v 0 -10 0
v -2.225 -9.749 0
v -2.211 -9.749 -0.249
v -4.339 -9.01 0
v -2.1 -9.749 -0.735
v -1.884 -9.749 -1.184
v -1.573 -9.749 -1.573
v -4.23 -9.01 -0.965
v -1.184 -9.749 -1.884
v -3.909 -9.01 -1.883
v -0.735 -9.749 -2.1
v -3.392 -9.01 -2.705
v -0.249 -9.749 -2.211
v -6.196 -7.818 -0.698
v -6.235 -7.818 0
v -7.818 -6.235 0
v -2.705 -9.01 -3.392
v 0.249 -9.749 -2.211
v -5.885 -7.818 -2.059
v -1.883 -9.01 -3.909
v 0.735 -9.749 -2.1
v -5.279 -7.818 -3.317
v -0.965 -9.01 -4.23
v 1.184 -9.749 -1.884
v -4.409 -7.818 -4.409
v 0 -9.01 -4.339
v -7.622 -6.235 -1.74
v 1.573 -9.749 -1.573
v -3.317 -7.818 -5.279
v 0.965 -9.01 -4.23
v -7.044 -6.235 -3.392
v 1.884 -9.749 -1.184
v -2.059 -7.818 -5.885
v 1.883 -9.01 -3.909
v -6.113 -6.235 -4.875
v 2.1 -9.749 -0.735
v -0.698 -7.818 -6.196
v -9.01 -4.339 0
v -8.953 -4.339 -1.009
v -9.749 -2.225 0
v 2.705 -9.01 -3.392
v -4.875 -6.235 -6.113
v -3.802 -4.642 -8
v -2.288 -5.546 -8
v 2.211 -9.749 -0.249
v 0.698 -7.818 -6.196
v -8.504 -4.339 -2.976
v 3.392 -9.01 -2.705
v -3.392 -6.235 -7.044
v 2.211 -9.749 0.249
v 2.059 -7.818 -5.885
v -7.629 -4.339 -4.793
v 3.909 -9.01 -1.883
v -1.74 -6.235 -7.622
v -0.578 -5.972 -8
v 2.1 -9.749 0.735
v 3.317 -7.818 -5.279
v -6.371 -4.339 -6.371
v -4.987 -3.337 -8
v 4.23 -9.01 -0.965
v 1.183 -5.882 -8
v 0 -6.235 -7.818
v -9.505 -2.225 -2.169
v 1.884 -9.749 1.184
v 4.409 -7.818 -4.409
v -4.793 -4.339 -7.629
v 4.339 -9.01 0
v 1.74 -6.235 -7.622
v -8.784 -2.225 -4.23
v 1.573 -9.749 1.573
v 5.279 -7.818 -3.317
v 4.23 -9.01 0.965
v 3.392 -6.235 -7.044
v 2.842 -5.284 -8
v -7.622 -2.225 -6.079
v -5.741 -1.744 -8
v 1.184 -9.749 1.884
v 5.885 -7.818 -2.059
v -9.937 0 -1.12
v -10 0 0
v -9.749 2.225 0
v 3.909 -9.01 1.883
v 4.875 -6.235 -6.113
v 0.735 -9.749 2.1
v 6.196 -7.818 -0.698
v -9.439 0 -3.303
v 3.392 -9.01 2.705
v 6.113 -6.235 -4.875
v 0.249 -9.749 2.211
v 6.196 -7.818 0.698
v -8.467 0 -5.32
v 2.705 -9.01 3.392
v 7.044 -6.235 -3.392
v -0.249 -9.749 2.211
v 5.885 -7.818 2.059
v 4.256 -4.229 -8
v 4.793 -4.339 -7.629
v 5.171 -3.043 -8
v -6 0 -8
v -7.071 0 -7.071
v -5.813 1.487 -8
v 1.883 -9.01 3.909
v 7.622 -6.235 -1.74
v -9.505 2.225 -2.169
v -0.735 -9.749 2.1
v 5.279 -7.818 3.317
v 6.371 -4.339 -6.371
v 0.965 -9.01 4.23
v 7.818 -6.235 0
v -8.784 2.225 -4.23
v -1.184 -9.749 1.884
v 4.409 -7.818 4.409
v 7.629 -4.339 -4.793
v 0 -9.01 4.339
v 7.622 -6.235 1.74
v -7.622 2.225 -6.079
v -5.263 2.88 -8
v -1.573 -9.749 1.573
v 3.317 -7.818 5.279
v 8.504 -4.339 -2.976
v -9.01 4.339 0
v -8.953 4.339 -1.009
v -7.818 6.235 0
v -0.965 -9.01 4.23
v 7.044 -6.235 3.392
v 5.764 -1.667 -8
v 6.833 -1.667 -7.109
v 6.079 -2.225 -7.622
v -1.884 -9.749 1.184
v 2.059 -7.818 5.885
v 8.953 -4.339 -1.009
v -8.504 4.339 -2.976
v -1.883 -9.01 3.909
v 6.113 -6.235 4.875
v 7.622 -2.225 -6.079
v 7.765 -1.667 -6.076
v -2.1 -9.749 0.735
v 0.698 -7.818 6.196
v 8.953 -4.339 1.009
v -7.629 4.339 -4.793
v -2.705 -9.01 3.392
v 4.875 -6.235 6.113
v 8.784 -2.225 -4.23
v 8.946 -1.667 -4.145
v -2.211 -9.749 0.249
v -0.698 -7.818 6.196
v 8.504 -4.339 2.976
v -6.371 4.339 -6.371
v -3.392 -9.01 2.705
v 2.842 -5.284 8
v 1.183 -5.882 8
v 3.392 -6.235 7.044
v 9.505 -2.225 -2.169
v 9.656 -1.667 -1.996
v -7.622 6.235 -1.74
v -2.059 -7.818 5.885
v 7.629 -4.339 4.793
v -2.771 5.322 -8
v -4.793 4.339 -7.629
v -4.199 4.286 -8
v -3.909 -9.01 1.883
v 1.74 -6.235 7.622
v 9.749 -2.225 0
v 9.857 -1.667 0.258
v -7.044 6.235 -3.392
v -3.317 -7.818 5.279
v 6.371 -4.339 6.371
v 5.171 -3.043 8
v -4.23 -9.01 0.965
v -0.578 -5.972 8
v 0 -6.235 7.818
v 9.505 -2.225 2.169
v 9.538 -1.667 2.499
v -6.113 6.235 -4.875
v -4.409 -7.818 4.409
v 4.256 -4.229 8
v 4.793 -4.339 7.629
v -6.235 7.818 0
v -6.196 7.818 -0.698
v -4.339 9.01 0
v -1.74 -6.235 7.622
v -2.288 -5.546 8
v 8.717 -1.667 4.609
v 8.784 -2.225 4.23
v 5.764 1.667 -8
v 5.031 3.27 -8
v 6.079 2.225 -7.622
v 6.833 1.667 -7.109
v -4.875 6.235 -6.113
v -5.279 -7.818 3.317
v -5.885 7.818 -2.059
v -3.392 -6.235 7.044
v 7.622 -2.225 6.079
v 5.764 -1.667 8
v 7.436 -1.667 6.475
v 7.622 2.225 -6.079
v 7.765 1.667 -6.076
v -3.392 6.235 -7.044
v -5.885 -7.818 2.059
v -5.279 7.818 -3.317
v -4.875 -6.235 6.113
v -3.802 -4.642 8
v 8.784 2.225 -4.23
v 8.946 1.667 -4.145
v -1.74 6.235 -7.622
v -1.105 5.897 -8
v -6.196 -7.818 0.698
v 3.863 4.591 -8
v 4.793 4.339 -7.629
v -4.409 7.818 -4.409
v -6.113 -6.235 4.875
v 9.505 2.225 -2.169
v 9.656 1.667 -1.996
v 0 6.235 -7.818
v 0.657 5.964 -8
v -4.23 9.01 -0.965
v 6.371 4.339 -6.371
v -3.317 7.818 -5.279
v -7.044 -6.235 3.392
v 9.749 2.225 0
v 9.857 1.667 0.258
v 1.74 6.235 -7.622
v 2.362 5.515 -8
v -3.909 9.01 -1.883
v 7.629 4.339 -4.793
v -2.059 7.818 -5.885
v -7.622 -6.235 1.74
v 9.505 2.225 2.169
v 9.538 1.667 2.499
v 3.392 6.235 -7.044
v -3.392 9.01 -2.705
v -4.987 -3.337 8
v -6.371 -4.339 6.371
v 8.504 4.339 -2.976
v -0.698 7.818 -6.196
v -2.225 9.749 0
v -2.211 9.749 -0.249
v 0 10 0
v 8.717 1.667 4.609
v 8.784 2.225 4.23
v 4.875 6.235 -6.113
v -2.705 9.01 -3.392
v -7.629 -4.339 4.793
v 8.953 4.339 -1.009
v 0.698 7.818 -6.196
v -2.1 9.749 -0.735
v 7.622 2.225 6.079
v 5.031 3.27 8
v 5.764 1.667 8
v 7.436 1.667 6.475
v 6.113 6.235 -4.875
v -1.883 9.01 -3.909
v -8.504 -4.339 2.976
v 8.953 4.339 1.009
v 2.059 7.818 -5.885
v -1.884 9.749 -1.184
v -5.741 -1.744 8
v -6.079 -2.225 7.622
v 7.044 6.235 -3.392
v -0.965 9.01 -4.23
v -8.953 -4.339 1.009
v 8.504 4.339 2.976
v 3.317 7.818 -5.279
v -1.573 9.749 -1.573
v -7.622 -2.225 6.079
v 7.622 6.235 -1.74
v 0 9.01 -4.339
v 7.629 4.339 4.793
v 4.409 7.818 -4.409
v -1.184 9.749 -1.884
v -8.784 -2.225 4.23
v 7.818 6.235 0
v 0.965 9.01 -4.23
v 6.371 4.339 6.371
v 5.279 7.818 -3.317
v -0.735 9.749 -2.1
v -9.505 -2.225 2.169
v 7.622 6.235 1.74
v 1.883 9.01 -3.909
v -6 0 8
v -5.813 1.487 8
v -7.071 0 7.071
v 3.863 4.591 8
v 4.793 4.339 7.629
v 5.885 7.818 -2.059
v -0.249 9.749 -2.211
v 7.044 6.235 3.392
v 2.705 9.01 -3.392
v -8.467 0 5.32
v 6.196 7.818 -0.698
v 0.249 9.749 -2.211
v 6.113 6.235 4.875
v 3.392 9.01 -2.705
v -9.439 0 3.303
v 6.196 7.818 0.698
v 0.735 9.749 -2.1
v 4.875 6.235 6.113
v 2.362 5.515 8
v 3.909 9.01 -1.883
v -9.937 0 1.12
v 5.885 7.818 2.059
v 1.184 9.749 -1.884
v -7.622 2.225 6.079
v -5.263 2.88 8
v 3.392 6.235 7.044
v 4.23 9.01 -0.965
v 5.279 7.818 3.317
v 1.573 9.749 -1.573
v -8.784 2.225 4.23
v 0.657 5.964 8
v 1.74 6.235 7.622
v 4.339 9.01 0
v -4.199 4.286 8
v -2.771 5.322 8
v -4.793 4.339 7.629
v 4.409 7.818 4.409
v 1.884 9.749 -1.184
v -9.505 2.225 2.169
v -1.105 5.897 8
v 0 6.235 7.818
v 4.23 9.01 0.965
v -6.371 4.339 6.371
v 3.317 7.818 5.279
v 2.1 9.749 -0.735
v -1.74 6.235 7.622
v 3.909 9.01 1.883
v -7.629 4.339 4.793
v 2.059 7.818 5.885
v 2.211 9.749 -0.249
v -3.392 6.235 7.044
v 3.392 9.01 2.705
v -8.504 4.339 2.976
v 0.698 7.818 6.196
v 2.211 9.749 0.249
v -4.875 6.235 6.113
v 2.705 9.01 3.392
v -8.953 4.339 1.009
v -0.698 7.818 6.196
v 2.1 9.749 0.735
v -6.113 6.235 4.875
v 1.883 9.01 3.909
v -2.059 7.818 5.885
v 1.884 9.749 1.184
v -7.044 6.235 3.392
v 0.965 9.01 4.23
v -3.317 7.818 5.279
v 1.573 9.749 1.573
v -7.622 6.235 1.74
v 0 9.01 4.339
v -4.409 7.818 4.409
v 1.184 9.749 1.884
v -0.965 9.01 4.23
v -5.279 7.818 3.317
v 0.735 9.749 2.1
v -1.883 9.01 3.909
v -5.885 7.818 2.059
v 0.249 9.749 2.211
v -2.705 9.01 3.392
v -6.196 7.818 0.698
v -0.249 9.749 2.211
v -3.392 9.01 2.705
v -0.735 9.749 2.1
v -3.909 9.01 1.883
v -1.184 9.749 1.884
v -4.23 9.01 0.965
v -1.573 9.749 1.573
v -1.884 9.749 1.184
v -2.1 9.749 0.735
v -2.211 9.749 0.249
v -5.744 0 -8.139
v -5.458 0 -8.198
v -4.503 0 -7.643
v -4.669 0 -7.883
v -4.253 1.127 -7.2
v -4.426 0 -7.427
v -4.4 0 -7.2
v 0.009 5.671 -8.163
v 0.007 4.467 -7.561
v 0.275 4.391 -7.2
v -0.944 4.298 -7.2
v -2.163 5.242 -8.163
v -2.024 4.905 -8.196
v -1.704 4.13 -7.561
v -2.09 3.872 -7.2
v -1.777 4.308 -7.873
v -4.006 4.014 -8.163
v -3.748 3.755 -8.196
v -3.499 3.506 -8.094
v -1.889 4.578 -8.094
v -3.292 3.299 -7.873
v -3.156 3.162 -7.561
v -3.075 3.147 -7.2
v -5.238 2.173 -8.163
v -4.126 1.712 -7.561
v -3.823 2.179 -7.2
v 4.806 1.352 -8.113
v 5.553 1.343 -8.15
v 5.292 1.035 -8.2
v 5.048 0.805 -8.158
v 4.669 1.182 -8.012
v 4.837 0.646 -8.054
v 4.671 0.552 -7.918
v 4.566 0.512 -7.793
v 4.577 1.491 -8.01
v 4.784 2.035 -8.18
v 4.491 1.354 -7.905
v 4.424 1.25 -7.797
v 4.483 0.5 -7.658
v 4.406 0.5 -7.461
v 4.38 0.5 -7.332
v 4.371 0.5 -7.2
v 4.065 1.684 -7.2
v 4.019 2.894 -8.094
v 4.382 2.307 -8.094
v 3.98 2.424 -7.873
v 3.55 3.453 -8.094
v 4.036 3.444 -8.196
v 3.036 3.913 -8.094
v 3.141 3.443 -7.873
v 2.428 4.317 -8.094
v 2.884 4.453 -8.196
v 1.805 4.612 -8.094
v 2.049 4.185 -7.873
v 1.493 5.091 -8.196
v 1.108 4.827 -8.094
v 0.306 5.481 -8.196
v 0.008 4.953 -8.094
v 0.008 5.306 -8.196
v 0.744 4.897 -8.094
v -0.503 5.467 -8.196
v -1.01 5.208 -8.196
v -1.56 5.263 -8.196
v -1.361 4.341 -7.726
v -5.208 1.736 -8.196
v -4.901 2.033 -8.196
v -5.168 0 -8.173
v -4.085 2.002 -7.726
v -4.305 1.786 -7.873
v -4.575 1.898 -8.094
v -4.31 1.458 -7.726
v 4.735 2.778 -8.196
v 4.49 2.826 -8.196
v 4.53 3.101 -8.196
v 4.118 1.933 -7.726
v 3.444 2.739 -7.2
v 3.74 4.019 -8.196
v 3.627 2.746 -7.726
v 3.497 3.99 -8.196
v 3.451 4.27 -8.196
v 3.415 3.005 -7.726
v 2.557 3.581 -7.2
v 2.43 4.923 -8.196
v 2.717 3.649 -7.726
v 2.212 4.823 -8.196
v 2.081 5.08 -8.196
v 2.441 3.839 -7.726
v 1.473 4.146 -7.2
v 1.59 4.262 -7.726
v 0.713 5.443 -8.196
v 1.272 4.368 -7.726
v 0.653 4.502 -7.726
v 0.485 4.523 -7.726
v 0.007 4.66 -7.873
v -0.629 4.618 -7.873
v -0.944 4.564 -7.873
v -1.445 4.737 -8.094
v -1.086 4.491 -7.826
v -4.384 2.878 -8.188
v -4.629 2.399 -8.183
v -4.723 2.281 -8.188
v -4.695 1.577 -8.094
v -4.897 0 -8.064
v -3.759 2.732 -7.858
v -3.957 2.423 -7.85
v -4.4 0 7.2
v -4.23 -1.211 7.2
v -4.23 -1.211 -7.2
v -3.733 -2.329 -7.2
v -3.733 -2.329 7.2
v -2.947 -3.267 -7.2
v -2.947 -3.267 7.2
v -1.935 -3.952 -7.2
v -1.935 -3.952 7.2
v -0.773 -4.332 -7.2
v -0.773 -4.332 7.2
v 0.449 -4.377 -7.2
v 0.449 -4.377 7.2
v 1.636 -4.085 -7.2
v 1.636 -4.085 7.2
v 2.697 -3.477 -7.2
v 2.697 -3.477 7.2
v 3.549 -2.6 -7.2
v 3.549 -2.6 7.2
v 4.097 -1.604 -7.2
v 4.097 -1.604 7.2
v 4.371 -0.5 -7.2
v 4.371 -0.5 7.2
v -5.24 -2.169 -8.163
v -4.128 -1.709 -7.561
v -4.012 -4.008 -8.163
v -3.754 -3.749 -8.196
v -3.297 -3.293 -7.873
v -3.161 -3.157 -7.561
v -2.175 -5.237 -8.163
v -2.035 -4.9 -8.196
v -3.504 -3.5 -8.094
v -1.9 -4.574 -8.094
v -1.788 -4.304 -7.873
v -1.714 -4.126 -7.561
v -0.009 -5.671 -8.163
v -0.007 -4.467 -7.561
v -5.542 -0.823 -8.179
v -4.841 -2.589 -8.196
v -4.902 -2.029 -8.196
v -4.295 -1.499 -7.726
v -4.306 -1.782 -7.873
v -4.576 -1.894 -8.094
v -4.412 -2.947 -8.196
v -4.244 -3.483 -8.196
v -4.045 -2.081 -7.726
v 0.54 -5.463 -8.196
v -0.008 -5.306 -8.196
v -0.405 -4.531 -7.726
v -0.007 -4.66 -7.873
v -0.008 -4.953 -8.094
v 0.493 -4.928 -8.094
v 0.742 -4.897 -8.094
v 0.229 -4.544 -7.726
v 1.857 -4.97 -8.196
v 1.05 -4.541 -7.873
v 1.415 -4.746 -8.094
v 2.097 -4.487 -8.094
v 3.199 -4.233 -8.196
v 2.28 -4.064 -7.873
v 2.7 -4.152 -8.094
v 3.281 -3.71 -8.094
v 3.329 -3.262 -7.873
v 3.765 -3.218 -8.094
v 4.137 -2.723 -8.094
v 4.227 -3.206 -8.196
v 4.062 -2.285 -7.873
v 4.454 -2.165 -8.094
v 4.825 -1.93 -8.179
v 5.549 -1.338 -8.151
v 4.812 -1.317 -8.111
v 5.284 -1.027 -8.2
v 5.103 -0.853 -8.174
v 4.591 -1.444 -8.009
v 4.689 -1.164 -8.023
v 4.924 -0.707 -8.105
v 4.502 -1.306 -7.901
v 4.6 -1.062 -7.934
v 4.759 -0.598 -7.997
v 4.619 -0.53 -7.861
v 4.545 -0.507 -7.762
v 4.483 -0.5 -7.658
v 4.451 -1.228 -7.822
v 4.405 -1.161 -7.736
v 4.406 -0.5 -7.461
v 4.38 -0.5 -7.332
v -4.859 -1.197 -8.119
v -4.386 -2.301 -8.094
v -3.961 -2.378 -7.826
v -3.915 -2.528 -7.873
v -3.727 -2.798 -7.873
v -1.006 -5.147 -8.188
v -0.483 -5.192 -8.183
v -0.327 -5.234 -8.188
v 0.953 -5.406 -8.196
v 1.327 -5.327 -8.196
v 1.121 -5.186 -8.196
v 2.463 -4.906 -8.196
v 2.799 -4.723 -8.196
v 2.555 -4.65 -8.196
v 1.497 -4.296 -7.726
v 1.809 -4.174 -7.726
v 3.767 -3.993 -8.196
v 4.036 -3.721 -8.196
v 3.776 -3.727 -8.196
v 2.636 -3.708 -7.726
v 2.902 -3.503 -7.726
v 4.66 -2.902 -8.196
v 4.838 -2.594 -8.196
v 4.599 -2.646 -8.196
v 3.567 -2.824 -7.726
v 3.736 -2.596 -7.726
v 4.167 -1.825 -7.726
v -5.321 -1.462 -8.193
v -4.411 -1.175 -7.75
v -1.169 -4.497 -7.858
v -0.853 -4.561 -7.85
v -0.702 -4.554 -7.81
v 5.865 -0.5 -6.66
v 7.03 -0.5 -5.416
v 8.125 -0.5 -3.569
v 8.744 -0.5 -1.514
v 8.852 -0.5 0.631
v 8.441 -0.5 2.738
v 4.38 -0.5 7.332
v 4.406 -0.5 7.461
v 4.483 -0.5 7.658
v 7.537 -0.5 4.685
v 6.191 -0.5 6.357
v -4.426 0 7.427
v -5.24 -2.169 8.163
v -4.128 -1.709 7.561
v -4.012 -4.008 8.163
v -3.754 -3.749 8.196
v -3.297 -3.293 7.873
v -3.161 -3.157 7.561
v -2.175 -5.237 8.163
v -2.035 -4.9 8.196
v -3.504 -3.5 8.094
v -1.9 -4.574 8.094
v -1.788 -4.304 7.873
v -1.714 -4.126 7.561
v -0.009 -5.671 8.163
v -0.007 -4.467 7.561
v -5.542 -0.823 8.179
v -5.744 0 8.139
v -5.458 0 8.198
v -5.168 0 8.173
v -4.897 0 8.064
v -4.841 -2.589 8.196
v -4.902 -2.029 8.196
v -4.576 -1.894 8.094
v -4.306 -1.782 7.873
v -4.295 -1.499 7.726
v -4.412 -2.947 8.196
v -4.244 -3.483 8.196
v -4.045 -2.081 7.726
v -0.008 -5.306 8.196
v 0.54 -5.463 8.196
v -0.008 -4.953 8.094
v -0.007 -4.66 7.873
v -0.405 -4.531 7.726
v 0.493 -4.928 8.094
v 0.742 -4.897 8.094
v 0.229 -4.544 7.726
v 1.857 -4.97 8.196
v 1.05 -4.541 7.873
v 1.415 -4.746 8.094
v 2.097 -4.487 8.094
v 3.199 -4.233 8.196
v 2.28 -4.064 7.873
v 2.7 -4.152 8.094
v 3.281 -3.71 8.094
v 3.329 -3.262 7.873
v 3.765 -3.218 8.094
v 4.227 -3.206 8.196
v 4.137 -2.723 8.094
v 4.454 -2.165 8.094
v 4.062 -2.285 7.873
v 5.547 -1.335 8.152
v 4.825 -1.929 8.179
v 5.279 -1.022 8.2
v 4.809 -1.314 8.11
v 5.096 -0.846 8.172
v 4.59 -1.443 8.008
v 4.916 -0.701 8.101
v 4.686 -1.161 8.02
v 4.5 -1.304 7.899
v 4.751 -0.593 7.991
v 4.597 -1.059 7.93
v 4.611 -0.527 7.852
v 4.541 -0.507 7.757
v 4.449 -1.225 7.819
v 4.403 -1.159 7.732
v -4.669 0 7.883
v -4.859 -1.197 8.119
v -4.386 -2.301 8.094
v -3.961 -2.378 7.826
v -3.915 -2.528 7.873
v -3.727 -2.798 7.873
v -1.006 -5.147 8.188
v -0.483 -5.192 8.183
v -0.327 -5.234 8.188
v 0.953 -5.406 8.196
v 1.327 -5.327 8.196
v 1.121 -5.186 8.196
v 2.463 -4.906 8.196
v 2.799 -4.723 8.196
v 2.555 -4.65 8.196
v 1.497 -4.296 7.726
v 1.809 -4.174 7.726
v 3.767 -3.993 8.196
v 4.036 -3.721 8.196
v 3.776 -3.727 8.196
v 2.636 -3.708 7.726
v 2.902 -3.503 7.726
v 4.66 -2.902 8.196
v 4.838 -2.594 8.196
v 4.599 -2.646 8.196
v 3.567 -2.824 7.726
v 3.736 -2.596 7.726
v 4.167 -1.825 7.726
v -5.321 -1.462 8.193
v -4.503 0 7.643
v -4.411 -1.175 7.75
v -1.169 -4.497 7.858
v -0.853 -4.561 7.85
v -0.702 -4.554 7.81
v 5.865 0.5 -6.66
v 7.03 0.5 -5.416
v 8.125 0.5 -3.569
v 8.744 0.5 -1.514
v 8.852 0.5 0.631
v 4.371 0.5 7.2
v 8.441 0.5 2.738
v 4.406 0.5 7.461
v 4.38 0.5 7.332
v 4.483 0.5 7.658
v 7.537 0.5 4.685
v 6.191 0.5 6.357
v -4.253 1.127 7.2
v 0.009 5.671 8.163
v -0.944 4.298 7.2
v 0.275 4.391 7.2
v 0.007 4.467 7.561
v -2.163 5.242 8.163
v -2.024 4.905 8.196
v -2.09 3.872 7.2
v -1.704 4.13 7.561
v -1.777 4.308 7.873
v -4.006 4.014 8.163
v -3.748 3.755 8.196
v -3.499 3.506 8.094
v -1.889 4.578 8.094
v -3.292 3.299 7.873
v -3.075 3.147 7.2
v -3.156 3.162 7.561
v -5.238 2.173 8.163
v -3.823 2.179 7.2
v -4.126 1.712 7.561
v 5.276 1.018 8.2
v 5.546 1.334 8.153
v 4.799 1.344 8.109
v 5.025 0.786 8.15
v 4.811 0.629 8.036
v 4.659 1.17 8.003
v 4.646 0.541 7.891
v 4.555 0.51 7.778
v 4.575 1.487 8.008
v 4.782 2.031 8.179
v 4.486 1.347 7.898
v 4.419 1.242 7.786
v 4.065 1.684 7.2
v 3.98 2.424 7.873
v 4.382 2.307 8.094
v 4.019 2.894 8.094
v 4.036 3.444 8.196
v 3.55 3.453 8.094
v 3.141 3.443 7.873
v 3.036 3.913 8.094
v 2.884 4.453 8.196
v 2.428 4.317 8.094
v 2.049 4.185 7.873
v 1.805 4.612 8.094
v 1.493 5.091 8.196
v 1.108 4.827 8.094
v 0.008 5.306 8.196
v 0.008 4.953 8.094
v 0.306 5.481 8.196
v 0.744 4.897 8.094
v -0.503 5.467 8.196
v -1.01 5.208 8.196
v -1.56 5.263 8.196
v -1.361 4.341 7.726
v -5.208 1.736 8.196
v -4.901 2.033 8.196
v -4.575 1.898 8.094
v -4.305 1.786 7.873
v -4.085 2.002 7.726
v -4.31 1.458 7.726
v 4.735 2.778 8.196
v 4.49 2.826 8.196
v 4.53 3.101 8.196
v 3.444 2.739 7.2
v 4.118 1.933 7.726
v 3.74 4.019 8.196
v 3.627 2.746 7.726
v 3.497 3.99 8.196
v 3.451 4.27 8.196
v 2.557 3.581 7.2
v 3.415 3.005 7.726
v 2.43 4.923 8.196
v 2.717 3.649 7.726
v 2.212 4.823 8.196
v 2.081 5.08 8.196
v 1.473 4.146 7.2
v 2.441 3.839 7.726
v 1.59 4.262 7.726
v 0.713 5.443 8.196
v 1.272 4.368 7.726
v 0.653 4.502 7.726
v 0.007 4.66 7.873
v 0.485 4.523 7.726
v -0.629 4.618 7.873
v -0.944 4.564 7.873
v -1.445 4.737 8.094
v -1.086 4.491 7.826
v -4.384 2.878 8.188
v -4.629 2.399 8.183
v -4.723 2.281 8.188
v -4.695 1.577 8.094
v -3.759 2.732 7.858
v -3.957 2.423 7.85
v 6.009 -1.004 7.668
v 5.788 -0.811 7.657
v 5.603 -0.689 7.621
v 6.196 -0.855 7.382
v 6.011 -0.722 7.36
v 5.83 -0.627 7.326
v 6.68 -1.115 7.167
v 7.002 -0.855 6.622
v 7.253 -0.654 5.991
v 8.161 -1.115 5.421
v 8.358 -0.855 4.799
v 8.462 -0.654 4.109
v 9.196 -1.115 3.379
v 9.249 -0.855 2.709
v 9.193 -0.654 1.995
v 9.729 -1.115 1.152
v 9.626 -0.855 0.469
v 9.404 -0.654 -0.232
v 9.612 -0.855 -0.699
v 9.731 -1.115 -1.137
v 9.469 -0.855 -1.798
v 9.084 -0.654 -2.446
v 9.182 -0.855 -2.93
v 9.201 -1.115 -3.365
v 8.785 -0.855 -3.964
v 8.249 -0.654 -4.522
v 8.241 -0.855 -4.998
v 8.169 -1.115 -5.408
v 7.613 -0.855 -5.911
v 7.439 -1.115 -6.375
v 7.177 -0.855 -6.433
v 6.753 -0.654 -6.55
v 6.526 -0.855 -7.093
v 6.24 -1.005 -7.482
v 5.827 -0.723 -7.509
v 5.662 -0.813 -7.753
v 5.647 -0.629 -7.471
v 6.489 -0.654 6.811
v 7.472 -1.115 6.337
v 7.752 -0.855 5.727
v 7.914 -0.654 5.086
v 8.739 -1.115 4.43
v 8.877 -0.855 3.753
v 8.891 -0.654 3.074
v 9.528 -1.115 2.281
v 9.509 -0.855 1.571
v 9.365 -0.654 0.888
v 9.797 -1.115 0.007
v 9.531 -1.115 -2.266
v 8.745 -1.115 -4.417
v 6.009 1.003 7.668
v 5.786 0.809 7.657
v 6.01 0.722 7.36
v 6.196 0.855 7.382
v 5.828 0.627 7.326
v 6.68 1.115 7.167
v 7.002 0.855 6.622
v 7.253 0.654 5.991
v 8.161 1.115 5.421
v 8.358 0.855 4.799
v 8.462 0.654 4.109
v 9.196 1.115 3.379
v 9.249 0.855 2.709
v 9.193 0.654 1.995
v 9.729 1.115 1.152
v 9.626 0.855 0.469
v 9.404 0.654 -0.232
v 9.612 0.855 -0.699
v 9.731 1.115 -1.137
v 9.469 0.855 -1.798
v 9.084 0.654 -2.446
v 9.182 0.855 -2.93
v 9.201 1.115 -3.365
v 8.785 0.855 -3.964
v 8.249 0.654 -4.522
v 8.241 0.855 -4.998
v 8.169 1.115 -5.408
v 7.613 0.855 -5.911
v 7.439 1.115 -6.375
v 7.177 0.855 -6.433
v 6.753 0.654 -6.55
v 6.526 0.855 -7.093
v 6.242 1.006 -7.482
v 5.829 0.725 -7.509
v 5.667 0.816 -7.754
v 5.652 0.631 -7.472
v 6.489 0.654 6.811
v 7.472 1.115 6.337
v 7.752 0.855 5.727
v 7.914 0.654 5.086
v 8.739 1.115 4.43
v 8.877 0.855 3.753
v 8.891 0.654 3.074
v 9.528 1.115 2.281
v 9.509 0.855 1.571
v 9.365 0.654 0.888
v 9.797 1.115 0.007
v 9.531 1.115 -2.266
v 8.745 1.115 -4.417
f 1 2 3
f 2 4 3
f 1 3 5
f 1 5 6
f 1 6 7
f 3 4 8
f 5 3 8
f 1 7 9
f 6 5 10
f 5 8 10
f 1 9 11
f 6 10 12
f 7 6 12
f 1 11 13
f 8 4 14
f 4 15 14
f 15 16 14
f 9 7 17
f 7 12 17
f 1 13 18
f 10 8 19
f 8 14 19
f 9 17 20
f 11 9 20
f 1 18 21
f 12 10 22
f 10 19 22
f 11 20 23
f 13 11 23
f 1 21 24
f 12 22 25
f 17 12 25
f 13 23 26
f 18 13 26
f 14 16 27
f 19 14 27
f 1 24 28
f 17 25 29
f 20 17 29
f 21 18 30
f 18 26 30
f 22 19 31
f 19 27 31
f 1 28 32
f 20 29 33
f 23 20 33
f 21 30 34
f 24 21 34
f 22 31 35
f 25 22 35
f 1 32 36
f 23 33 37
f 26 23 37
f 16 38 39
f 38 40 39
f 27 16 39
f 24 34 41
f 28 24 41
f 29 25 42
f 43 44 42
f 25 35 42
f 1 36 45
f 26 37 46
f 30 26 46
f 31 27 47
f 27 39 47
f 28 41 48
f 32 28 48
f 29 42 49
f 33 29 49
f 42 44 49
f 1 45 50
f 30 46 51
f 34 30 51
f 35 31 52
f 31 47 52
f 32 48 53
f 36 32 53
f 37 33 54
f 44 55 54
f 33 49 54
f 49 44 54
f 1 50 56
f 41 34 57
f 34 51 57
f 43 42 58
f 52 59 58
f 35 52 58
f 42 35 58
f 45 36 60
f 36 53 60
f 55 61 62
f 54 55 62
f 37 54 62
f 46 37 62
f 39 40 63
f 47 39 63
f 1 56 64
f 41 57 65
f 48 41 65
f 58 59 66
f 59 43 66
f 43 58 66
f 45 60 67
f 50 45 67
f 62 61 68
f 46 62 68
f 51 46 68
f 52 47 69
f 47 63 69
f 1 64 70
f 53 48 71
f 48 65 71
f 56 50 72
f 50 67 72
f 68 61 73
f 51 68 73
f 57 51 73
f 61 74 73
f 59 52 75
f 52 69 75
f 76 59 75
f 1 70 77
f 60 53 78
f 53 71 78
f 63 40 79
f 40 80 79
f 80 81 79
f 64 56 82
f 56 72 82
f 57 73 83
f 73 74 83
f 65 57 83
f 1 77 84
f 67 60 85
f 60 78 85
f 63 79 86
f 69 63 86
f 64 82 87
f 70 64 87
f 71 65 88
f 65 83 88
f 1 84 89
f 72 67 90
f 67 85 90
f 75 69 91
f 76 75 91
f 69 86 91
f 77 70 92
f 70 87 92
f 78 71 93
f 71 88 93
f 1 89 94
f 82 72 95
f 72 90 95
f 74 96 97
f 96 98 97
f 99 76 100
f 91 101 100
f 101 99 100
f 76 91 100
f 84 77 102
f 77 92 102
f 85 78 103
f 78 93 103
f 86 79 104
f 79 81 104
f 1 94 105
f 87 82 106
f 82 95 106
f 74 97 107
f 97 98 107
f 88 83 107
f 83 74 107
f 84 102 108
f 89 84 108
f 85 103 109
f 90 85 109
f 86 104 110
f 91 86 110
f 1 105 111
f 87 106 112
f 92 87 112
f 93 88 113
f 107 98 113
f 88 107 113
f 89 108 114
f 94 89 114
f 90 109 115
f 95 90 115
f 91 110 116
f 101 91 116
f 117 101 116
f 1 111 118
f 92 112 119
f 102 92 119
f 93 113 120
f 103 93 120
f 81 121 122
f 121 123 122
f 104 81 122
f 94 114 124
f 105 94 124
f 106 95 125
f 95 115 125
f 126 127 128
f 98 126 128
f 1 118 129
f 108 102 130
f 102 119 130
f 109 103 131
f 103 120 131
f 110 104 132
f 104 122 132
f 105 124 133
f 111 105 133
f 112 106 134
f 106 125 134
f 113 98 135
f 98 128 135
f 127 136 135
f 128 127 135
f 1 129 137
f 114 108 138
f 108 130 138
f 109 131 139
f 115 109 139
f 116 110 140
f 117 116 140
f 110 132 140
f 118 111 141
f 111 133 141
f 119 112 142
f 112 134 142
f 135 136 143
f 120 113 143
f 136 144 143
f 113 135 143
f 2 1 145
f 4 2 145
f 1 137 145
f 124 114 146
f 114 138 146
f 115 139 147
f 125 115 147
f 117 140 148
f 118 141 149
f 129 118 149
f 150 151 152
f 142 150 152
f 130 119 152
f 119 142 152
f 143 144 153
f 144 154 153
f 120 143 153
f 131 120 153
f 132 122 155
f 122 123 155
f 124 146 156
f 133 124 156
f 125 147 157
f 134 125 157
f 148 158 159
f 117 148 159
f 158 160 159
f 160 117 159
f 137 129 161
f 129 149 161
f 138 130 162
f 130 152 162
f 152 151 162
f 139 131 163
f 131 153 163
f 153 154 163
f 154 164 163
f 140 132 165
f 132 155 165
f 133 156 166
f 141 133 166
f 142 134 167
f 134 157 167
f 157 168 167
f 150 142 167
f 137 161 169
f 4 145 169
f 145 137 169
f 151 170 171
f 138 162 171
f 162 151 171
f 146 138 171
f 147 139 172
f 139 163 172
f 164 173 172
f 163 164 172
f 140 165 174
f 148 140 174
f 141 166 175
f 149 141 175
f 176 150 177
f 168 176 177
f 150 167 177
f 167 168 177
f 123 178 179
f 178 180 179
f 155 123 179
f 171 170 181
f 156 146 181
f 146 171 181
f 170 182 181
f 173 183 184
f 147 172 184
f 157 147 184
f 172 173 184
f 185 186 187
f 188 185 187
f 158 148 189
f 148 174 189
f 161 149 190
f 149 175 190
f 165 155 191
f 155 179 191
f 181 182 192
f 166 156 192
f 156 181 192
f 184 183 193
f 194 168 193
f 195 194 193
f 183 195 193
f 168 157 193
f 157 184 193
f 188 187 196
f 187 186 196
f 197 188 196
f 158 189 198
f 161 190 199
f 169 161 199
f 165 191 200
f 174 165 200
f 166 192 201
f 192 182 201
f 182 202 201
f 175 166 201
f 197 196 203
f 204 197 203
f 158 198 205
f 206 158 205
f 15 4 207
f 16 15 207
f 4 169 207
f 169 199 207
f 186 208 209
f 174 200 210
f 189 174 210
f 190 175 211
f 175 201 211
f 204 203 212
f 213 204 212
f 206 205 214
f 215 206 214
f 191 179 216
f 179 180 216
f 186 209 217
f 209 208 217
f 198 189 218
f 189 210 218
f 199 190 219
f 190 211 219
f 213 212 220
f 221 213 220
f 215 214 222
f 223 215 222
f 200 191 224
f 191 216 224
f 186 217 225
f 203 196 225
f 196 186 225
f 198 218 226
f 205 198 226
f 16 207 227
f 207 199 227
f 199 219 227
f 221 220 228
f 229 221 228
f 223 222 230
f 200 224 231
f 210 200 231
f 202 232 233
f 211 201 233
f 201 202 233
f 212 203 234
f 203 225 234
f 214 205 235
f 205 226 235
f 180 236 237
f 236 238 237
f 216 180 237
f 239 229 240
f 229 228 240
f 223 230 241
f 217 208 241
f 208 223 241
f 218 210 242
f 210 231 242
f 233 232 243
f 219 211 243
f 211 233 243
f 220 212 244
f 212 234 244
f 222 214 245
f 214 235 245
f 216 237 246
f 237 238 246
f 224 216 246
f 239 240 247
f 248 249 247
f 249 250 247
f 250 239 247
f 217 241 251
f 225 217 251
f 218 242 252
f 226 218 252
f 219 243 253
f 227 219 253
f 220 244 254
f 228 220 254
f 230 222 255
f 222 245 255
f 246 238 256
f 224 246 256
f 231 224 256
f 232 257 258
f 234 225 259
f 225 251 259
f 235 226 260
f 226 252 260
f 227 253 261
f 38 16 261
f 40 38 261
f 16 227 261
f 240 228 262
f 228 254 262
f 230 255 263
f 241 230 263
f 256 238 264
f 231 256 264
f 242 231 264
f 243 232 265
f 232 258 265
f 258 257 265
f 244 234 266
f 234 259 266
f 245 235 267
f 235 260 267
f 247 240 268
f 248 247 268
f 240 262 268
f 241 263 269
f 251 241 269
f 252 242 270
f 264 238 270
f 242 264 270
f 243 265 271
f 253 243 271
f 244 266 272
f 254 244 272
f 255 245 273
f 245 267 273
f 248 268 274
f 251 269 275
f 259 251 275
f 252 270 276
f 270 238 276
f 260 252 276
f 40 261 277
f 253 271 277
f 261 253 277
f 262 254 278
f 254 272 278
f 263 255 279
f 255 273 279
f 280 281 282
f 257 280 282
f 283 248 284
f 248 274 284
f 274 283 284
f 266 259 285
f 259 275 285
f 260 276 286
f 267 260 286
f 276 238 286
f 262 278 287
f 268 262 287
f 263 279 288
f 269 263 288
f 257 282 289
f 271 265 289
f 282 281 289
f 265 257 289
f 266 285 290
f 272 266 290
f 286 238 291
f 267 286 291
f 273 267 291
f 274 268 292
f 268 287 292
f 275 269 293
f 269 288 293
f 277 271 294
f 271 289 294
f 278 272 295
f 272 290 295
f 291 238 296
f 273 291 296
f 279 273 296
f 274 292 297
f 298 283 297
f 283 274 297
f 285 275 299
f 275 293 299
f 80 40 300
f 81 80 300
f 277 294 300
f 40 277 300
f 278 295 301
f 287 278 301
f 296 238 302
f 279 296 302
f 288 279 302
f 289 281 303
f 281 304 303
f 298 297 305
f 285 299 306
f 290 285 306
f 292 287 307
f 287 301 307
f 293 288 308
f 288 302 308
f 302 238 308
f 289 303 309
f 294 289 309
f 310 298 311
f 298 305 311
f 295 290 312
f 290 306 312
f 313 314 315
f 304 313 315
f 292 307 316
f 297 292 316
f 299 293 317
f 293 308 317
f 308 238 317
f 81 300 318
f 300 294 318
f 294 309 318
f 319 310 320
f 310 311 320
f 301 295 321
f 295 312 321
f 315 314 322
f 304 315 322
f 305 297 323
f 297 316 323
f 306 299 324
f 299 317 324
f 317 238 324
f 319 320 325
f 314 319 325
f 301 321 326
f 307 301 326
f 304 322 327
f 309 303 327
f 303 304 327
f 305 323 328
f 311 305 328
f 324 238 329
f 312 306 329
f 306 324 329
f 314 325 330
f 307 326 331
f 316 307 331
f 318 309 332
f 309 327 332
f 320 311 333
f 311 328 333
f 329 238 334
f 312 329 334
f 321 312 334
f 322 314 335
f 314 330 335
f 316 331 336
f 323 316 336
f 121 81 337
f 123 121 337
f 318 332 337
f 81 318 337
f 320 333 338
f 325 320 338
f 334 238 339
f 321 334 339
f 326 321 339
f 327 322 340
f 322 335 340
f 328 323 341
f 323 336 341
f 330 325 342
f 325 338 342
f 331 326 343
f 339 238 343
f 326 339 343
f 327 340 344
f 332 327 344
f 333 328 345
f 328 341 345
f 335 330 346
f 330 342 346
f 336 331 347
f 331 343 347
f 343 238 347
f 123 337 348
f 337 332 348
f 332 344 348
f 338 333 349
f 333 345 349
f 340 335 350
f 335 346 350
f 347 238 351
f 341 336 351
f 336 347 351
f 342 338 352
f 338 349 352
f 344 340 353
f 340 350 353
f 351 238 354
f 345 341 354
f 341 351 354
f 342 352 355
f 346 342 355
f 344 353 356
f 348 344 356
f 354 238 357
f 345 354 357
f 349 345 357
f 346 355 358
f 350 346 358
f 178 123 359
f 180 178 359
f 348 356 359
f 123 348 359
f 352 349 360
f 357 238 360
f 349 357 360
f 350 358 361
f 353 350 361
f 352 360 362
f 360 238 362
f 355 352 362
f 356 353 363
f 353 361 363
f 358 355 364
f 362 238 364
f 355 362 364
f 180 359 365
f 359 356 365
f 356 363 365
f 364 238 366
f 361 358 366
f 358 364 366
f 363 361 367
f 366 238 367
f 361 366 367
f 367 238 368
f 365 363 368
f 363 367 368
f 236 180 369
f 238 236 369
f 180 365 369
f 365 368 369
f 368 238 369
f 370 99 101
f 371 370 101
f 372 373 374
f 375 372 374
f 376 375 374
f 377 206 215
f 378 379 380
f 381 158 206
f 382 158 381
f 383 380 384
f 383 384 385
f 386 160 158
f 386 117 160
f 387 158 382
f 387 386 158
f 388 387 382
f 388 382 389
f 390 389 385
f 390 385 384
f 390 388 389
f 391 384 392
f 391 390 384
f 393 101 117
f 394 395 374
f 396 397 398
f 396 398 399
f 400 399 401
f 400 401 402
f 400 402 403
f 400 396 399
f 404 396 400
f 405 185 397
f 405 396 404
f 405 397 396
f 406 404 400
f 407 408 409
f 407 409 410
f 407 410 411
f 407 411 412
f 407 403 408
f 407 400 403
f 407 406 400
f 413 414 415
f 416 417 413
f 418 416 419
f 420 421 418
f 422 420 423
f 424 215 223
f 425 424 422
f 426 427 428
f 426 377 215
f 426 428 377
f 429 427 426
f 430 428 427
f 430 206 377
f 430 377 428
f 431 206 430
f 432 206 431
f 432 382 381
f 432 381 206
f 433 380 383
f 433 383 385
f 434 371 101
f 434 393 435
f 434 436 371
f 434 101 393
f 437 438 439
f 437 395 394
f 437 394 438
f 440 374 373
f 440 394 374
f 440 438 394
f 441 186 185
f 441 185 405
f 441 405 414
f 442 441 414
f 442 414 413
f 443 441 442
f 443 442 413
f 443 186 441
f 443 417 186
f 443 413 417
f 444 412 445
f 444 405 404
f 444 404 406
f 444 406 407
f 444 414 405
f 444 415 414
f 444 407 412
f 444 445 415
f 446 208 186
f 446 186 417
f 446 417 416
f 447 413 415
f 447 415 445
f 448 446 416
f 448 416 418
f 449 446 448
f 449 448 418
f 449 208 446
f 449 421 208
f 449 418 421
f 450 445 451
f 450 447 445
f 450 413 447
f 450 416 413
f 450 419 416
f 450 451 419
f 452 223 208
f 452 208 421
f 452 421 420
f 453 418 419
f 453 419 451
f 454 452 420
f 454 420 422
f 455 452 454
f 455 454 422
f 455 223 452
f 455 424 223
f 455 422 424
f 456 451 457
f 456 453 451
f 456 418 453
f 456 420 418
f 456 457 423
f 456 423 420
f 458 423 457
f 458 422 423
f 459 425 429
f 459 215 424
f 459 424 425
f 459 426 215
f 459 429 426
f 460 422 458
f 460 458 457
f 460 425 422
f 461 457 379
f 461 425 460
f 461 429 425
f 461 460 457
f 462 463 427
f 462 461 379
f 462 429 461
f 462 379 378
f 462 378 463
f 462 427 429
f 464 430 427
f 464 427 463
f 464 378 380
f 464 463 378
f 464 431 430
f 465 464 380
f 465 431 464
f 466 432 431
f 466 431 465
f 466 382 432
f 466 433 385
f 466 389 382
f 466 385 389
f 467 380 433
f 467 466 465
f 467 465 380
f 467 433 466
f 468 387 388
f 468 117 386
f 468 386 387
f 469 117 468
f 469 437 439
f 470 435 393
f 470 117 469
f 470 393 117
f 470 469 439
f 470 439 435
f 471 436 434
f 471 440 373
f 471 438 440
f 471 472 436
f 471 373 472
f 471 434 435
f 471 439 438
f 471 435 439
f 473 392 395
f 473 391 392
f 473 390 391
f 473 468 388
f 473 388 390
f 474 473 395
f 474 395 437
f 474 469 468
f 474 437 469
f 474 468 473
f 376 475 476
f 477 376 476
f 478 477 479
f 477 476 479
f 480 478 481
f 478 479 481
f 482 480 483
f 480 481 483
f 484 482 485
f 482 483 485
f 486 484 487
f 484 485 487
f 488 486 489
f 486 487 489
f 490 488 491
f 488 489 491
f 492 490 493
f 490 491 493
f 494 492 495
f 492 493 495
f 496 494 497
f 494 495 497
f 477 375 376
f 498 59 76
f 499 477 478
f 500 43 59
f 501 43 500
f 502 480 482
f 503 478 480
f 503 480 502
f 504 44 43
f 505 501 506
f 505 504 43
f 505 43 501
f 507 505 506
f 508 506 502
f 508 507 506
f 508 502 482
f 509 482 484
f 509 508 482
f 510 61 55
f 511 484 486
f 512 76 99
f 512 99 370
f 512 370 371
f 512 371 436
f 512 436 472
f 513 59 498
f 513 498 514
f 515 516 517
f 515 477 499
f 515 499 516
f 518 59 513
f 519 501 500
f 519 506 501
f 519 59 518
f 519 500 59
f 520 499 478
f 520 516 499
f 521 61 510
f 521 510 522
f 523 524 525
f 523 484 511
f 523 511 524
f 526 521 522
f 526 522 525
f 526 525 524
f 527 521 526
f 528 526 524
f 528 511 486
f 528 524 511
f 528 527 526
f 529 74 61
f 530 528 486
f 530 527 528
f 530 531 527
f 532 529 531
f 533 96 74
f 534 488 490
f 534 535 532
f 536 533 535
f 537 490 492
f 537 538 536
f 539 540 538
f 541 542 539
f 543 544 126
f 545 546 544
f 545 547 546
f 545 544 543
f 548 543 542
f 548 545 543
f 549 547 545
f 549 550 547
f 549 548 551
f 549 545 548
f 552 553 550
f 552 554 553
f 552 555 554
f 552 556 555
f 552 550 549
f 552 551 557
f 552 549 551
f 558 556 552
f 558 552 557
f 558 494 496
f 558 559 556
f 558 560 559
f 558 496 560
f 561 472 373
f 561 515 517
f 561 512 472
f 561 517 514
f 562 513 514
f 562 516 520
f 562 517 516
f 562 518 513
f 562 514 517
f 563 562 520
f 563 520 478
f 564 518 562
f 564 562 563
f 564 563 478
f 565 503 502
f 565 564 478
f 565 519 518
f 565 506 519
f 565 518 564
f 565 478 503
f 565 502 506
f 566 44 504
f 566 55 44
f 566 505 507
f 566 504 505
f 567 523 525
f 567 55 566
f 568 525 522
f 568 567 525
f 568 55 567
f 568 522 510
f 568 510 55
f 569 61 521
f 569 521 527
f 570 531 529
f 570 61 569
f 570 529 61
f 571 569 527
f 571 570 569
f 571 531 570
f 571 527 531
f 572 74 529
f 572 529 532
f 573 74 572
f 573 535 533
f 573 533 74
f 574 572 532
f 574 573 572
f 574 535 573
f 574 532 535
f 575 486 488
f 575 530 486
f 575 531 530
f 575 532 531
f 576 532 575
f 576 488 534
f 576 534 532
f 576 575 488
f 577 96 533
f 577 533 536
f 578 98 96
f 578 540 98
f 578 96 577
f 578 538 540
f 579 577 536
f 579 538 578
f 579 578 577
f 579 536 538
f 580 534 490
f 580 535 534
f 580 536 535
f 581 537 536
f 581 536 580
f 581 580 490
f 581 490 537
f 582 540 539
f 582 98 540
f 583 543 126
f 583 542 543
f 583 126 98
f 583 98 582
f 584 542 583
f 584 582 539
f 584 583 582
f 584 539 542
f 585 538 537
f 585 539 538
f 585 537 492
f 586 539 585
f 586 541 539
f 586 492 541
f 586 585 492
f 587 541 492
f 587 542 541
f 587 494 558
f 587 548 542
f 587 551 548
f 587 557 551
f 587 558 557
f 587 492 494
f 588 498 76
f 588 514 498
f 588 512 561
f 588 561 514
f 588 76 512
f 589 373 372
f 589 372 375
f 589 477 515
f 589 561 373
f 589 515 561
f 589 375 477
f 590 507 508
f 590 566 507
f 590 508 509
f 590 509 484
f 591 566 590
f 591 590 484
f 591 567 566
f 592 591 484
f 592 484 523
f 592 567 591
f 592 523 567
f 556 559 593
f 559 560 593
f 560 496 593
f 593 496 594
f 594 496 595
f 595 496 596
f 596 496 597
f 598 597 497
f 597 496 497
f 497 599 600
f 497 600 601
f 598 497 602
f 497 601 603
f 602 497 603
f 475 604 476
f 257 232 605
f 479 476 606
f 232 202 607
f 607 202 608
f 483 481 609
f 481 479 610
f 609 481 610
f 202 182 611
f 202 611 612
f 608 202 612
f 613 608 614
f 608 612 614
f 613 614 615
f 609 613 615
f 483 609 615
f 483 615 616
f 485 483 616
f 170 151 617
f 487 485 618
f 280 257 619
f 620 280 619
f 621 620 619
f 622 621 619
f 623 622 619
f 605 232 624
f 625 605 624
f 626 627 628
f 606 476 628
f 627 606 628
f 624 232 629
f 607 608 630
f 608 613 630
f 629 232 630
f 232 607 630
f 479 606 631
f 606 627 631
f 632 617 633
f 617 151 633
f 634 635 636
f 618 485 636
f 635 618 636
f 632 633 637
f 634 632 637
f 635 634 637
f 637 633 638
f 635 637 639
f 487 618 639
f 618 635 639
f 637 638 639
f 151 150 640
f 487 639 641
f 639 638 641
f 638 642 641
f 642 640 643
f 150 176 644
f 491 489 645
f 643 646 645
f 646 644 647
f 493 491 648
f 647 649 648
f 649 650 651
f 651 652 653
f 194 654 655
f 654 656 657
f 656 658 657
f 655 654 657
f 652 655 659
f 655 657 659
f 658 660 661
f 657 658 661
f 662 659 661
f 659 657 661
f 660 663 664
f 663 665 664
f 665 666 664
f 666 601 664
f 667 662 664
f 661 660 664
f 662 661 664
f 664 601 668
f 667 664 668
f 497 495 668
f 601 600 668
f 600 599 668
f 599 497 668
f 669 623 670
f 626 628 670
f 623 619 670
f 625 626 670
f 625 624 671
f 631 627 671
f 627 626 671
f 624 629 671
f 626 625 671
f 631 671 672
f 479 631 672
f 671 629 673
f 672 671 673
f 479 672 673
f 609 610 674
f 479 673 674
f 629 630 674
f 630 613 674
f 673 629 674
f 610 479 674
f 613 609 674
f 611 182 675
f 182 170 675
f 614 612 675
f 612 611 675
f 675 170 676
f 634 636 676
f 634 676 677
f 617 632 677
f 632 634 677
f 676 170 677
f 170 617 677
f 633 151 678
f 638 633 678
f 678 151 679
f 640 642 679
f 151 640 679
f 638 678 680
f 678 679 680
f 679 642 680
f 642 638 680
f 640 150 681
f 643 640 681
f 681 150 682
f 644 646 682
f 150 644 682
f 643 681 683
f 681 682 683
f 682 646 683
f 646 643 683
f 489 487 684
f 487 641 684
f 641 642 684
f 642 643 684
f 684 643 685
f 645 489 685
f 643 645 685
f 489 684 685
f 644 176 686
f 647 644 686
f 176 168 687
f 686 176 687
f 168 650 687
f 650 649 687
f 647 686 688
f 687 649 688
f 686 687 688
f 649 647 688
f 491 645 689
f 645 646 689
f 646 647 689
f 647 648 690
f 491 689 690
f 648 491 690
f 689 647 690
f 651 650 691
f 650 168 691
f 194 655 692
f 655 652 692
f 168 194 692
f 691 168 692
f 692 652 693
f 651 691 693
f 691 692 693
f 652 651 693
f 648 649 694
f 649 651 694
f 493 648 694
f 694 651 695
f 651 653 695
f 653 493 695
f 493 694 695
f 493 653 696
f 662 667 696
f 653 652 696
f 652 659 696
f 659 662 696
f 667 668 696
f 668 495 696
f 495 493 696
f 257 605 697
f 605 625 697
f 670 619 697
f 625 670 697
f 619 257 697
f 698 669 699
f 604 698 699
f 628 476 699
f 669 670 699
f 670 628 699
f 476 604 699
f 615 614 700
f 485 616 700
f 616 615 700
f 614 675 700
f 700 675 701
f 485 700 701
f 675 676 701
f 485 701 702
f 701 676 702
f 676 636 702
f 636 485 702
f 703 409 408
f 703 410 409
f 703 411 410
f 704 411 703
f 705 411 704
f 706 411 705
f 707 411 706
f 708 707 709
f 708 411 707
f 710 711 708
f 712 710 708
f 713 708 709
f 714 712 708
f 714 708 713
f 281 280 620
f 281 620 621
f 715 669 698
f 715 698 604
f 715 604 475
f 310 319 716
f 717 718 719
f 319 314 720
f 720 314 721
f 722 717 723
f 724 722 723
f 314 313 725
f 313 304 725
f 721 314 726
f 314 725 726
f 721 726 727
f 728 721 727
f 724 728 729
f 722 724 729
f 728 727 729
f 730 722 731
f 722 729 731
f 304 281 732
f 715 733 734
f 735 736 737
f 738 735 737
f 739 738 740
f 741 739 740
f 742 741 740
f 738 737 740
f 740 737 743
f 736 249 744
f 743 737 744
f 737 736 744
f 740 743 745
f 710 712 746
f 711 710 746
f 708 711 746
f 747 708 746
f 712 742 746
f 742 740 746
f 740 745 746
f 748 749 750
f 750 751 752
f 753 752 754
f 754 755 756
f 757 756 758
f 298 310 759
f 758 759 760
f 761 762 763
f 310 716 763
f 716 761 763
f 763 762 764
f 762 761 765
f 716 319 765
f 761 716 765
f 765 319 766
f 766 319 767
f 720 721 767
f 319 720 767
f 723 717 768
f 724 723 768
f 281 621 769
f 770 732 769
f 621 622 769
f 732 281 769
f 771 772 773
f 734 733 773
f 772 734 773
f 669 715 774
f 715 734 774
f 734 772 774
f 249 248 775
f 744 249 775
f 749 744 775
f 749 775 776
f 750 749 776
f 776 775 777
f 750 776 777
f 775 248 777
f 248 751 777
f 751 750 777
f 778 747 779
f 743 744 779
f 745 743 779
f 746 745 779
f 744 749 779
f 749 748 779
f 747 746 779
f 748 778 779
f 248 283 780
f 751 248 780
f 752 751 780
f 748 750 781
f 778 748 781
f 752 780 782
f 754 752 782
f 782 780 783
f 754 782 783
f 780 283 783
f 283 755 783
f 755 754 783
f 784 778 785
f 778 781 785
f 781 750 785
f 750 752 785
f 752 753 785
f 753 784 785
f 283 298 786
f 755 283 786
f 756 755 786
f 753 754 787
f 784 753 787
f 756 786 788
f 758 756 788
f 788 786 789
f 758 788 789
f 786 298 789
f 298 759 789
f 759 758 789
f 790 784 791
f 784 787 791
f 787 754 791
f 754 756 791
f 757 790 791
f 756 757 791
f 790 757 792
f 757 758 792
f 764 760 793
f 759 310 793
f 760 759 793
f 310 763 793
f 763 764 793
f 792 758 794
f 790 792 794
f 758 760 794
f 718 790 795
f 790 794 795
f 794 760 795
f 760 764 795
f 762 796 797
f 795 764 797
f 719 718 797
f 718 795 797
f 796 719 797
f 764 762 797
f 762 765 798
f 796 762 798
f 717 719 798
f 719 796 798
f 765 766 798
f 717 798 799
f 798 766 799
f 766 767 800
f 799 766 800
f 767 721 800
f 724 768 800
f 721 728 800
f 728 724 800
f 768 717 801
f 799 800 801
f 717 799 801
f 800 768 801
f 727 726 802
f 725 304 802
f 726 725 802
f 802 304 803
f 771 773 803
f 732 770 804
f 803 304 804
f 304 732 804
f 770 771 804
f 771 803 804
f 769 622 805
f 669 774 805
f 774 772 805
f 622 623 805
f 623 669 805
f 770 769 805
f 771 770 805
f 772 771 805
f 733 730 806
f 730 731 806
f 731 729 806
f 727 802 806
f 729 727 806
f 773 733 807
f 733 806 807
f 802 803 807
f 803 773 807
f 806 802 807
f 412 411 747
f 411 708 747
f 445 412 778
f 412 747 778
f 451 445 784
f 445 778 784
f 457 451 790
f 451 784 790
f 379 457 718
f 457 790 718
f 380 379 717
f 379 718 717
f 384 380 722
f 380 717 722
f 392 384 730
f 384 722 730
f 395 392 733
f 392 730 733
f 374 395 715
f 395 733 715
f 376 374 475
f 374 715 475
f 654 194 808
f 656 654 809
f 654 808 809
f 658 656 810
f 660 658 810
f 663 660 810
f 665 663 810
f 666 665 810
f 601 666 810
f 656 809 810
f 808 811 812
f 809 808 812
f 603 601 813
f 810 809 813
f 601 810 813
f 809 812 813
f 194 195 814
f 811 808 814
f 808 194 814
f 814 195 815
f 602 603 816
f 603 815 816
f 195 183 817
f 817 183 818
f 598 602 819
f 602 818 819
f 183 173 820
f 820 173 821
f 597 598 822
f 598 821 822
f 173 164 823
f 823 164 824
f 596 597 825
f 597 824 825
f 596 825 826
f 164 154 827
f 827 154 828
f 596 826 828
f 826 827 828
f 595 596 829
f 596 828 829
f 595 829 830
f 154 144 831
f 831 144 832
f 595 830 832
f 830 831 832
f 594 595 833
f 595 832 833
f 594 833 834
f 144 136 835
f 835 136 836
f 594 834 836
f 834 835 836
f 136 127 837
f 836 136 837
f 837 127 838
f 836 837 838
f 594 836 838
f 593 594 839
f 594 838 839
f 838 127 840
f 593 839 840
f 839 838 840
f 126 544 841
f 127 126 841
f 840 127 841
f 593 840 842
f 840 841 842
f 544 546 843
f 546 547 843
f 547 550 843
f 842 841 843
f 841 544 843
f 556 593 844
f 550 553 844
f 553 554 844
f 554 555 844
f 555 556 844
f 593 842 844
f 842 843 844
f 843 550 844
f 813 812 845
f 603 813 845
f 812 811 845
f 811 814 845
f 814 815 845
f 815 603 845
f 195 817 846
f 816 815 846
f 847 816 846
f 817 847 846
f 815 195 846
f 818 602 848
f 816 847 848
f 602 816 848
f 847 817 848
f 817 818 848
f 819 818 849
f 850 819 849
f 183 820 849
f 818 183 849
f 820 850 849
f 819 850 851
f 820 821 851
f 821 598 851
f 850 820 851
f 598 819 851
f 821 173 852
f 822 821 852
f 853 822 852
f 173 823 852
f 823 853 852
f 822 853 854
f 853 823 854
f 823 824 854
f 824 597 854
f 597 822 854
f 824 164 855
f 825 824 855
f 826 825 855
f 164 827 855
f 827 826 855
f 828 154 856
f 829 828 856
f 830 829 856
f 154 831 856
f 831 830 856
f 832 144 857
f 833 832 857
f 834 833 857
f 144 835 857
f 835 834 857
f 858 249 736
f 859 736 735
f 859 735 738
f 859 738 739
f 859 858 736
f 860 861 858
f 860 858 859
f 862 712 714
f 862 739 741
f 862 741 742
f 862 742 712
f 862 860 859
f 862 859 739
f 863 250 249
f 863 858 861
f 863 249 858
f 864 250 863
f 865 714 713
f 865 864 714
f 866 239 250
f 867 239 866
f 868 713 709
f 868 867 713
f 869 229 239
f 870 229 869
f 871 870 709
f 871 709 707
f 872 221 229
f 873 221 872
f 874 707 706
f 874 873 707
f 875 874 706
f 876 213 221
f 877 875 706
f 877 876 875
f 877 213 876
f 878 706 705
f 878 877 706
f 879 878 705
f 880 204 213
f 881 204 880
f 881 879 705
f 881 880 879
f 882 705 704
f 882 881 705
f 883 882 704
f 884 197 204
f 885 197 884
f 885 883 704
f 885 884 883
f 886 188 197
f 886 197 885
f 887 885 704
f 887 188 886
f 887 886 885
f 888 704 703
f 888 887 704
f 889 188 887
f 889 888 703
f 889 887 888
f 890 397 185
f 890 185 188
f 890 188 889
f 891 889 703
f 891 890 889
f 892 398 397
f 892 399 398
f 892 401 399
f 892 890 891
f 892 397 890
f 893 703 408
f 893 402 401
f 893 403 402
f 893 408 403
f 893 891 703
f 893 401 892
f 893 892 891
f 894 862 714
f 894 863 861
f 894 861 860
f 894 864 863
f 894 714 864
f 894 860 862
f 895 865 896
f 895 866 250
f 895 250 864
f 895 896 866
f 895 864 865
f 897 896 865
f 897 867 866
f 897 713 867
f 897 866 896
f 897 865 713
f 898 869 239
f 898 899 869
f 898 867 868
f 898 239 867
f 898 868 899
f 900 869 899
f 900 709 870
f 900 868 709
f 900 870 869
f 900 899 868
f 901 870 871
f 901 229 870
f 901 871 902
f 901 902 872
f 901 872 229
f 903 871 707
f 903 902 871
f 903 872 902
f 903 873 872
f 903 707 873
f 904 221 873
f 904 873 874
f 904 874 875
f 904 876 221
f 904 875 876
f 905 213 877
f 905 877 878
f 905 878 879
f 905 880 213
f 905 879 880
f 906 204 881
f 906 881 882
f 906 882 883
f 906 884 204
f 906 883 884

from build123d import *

# Parameters (mm, degrees)
SKETCH_2_R          = 4.4
CUT_EXTRUDE_1_DEPTH = 15
SKETCH_3_W          = 10.421641006
SKETCH_3_H          = 1
CUT_EXTRUDE_2_DEPTH = 15
FILLET_1_R          = 1


with BuildPart() as part:
    # 스케치1 → 회전2 (revolve)
    with BuildSketch(Plane.XY):
        with BuildLine():
            Line((0, 10), (0, -10))
            ThreePointArc((0, -10), (-10, 0), (0, 10))
        make_face()
    revolve(axis=Axis((0, 11.789684906, 0), (0, -1, 0)))

    # 스케치2 → 컷-돌출1 (cut, symmetric)
    with BuildSketch(Plane.XY):
        with Locations(Location((0, 0, 0), (0, 0, 180))):
            Circle(SKETCH_2_R)
    extrude(amount=CUT_EXTRUDE_1_DEPTH, both=True, mode=Mode.SUBTRACT)

    # 스케치3 → 컷-돌출2 (cut, symmetric)
    with BuildSketch(Plane.XY):
        with Locations((6.647452601, 0)):
            Rectangle(SKETCH_3_W, SKETCH_3_H)
    extrude(amount=CUT_EXTRUDE_2_DEPTH, both=True, mode=Mode.SUBTRACT)

    # 필렛1
    fillet_1_edges = [part.edges().sort_by_distance(p)[0] for p in [
        (-0.250405834, -4.392868837, 8.979977728),
        (9.987492178, 0.5, 0),
        (9.987492178, -0.5, 0),
        (-0.250405834, -4.392868837, -8.979977728),
    ]]
    fillet(fillet_1_edges, radius=FILLET_1_R)


solid = part.part
